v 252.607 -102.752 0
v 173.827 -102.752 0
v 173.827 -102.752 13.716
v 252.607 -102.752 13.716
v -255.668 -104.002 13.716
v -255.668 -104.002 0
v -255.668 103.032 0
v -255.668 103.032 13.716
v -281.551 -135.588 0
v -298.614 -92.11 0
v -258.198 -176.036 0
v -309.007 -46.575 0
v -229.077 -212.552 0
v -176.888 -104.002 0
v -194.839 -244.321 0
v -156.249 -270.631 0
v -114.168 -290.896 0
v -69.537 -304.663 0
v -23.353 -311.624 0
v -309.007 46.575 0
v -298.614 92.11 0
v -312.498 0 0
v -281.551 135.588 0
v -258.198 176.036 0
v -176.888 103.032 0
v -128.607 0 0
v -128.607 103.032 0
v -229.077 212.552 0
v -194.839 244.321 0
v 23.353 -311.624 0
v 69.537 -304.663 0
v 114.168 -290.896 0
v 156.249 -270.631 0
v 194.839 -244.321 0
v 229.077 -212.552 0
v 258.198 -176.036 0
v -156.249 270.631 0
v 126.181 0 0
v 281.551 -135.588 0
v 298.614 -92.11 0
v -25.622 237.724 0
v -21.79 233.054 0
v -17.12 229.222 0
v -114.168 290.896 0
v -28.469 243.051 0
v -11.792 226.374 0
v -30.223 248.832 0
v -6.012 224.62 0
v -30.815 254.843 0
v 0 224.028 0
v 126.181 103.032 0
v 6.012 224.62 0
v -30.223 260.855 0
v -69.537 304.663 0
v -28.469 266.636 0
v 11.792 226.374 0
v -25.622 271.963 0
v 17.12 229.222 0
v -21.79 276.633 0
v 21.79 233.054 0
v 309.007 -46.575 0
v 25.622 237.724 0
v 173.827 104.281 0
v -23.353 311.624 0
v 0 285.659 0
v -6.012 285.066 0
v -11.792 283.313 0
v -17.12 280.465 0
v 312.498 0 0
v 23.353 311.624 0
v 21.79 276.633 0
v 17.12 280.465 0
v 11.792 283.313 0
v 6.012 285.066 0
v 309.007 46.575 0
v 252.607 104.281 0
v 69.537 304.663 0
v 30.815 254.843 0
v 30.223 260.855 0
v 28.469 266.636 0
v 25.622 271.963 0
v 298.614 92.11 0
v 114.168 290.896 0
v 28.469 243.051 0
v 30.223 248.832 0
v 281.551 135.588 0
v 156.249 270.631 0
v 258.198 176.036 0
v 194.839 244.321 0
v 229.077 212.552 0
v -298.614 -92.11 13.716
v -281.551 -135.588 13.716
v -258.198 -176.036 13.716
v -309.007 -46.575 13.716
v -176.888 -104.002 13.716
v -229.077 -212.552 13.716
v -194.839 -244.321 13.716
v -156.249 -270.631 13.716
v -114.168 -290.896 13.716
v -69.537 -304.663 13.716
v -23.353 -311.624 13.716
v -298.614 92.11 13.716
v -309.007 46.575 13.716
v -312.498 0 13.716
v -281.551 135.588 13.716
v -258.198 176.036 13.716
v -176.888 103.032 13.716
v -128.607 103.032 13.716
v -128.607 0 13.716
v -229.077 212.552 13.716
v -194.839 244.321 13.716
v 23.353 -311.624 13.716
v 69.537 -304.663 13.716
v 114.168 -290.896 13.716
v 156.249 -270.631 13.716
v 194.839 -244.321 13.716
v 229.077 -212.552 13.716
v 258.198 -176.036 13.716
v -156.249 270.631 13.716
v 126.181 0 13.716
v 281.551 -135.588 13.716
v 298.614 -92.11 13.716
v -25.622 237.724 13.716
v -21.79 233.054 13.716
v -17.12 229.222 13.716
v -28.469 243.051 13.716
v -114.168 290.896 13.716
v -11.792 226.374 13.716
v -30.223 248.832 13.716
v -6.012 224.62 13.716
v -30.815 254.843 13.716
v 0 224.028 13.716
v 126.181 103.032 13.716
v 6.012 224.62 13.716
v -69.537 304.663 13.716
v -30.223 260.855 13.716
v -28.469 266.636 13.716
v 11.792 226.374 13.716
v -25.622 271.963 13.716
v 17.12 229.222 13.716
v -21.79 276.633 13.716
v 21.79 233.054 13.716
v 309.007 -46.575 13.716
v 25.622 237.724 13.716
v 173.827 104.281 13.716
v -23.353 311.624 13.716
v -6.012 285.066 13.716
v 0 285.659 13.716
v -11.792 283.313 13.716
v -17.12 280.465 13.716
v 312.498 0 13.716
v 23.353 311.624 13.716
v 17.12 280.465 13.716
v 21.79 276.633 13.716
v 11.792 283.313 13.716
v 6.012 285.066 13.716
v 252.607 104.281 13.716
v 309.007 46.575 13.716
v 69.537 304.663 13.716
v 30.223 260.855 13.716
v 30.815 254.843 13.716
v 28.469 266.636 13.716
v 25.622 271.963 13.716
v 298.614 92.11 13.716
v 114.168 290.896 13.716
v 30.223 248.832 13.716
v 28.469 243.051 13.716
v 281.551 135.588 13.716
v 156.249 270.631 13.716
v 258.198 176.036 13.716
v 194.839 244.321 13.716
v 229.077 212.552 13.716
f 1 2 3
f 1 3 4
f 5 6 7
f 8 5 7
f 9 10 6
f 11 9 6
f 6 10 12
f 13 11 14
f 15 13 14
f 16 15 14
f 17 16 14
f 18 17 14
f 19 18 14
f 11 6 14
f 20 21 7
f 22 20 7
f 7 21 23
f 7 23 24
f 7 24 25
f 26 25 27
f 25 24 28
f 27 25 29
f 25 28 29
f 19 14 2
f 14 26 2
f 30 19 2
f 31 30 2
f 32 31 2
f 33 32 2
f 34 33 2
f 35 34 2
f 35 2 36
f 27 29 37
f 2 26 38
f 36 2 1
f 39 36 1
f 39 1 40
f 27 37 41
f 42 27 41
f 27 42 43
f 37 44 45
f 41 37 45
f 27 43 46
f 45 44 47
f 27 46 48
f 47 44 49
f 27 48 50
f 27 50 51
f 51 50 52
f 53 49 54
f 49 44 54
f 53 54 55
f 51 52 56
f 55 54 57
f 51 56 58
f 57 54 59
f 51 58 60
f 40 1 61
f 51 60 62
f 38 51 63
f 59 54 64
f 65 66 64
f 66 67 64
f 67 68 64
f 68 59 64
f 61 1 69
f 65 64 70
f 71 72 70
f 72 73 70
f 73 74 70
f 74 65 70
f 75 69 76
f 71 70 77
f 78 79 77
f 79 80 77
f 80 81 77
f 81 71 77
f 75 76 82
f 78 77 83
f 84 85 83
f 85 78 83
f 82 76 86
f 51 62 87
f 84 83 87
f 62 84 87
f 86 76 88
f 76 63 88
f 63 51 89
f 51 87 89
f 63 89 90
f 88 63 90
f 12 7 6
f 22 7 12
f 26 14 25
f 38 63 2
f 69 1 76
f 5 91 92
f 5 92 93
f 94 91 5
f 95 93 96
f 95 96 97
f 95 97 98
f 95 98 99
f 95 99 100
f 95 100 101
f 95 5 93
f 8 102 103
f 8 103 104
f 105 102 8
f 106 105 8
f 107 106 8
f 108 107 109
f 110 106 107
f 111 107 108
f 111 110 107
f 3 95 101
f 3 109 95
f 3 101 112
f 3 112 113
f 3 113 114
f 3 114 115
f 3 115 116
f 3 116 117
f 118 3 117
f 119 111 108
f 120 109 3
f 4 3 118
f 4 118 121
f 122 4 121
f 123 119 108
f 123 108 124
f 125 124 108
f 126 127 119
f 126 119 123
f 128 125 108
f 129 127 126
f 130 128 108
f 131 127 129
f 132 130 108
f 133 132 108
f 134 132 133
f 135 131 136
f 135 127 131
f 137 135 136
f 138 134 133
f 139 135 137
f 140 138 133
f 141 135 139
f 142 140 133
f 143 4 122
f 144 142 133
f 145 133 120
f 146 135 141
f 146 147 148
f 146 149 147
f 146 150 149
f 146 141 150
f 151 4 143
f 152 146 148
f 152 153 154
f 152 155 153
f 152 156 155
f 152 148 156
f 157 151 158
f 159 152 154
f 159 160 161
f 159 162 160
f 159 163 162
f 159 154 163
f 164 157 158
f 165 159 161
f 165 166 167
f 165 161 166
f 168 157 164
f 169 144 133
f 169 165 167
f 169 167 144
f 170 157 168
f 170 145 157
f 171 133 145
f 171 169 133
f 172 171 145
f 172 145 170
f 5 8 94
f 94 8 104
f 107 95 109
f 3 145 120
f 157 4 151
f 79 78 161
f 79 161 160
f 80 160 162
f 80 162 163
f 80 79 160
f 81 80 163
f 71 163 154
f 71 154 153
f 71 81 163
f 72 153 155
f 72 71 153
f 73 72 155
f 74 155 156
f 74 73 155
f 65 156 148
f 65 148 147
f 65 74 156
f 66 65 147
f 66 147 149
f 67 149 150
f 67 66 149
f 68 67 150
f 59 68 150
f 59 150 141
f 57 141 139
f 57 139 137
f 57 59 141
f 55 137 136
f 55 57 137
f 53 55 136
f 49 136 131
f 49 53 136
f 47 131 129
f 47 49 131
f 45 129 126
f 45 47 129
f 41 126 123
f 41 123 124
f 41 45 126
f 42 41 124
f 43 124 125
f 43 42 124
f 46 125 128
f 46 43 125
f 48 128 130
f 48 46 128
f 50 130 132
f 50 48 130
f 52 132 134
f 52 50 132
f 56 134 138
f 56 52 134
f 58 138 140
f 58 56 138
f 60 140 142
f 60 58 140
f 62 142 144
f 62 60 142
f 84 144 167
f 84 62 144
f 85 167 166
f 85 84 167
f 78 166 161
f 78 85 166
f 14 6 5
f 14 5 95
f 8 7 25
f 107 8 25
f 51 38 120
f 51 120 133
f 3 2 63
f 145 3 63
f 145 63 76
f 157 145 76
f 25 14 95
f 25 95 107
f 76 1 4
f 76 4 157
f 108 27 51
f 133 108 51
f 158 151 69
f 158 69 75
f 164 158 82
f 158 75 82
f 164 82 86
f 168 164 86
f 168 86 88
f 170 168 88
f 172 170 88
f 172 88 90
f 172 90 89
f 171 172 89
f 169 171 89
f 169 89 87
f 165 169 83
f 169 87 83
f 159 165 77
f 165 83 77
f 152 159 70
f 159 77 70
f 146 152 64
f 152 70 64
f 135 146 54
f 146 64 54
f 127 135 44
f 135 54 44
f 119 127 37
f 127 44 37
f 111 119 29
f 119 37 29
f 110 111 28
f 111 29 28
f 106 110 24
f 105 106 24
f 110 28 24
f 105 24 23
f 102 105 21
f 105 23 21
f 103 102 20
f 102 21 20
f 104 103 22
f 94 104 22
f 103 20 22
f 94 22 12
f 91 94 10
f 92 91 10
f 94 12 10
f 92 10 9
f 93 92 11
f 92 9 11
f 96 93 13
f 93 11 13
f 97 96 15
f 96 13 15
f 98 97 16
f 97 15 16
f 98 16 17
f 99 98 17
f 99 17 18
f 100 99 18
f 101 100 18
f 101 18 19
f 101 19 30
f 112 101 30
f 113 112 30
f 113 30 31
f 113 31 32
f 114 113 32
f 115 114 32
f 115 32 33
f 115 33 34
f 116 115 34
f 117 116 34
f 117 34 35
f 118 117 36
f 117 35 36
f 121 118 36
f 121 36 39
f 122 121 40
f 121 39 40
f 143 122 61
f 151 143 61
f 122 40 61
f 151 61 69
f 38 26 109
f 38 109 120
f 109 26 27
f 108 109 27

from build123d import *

# Parameters (mm, degrees)
SKETCH1_R           = 312.497780416
SKETCH1_R_2         = 30.815082176
SKETCH1_W           = 78.780158854
SKETCH1_H           = 207.033394325
SKETCH1_H_2         = 207.033394324
SKETCH1_W_2         = 254.787899309
SKETCH1_H_3         = 103.031623715
BOSS_EXTRUDE1_DEPTH = 13.716


with BuildPart() as part:
    # Sketch1 → Boss-Extrude1 (new body)
    with BuildSketch(Plane.XY):
        Circle(SKETCH1_R)
        with Locations((0, 254.843469114)):
            Circle(SKETCH1_R_2, mode=Mode.SUBTRACT)
        with Locations((213.217227107, 0.764216519)):
            Rectangle(SKETCH1_W, SKETCH1_H, mode=Mode.SUBTRACT)
        with Locations((-216.277951012, -0.485073447)):
            Rectangle(SKETCH1_W, SKETCH1_H_2, mode=Mode.SUBTRACT)
        with Locations((-1.212629894, 51.515811858)):
            Rectangle(SKETCH1_W_2, SKETCH1_H_3, mode=Mode.SUBTRACT)
    extrude(amount=BOSS_EXTRUDE1_DEPTH)


solid = part.part
